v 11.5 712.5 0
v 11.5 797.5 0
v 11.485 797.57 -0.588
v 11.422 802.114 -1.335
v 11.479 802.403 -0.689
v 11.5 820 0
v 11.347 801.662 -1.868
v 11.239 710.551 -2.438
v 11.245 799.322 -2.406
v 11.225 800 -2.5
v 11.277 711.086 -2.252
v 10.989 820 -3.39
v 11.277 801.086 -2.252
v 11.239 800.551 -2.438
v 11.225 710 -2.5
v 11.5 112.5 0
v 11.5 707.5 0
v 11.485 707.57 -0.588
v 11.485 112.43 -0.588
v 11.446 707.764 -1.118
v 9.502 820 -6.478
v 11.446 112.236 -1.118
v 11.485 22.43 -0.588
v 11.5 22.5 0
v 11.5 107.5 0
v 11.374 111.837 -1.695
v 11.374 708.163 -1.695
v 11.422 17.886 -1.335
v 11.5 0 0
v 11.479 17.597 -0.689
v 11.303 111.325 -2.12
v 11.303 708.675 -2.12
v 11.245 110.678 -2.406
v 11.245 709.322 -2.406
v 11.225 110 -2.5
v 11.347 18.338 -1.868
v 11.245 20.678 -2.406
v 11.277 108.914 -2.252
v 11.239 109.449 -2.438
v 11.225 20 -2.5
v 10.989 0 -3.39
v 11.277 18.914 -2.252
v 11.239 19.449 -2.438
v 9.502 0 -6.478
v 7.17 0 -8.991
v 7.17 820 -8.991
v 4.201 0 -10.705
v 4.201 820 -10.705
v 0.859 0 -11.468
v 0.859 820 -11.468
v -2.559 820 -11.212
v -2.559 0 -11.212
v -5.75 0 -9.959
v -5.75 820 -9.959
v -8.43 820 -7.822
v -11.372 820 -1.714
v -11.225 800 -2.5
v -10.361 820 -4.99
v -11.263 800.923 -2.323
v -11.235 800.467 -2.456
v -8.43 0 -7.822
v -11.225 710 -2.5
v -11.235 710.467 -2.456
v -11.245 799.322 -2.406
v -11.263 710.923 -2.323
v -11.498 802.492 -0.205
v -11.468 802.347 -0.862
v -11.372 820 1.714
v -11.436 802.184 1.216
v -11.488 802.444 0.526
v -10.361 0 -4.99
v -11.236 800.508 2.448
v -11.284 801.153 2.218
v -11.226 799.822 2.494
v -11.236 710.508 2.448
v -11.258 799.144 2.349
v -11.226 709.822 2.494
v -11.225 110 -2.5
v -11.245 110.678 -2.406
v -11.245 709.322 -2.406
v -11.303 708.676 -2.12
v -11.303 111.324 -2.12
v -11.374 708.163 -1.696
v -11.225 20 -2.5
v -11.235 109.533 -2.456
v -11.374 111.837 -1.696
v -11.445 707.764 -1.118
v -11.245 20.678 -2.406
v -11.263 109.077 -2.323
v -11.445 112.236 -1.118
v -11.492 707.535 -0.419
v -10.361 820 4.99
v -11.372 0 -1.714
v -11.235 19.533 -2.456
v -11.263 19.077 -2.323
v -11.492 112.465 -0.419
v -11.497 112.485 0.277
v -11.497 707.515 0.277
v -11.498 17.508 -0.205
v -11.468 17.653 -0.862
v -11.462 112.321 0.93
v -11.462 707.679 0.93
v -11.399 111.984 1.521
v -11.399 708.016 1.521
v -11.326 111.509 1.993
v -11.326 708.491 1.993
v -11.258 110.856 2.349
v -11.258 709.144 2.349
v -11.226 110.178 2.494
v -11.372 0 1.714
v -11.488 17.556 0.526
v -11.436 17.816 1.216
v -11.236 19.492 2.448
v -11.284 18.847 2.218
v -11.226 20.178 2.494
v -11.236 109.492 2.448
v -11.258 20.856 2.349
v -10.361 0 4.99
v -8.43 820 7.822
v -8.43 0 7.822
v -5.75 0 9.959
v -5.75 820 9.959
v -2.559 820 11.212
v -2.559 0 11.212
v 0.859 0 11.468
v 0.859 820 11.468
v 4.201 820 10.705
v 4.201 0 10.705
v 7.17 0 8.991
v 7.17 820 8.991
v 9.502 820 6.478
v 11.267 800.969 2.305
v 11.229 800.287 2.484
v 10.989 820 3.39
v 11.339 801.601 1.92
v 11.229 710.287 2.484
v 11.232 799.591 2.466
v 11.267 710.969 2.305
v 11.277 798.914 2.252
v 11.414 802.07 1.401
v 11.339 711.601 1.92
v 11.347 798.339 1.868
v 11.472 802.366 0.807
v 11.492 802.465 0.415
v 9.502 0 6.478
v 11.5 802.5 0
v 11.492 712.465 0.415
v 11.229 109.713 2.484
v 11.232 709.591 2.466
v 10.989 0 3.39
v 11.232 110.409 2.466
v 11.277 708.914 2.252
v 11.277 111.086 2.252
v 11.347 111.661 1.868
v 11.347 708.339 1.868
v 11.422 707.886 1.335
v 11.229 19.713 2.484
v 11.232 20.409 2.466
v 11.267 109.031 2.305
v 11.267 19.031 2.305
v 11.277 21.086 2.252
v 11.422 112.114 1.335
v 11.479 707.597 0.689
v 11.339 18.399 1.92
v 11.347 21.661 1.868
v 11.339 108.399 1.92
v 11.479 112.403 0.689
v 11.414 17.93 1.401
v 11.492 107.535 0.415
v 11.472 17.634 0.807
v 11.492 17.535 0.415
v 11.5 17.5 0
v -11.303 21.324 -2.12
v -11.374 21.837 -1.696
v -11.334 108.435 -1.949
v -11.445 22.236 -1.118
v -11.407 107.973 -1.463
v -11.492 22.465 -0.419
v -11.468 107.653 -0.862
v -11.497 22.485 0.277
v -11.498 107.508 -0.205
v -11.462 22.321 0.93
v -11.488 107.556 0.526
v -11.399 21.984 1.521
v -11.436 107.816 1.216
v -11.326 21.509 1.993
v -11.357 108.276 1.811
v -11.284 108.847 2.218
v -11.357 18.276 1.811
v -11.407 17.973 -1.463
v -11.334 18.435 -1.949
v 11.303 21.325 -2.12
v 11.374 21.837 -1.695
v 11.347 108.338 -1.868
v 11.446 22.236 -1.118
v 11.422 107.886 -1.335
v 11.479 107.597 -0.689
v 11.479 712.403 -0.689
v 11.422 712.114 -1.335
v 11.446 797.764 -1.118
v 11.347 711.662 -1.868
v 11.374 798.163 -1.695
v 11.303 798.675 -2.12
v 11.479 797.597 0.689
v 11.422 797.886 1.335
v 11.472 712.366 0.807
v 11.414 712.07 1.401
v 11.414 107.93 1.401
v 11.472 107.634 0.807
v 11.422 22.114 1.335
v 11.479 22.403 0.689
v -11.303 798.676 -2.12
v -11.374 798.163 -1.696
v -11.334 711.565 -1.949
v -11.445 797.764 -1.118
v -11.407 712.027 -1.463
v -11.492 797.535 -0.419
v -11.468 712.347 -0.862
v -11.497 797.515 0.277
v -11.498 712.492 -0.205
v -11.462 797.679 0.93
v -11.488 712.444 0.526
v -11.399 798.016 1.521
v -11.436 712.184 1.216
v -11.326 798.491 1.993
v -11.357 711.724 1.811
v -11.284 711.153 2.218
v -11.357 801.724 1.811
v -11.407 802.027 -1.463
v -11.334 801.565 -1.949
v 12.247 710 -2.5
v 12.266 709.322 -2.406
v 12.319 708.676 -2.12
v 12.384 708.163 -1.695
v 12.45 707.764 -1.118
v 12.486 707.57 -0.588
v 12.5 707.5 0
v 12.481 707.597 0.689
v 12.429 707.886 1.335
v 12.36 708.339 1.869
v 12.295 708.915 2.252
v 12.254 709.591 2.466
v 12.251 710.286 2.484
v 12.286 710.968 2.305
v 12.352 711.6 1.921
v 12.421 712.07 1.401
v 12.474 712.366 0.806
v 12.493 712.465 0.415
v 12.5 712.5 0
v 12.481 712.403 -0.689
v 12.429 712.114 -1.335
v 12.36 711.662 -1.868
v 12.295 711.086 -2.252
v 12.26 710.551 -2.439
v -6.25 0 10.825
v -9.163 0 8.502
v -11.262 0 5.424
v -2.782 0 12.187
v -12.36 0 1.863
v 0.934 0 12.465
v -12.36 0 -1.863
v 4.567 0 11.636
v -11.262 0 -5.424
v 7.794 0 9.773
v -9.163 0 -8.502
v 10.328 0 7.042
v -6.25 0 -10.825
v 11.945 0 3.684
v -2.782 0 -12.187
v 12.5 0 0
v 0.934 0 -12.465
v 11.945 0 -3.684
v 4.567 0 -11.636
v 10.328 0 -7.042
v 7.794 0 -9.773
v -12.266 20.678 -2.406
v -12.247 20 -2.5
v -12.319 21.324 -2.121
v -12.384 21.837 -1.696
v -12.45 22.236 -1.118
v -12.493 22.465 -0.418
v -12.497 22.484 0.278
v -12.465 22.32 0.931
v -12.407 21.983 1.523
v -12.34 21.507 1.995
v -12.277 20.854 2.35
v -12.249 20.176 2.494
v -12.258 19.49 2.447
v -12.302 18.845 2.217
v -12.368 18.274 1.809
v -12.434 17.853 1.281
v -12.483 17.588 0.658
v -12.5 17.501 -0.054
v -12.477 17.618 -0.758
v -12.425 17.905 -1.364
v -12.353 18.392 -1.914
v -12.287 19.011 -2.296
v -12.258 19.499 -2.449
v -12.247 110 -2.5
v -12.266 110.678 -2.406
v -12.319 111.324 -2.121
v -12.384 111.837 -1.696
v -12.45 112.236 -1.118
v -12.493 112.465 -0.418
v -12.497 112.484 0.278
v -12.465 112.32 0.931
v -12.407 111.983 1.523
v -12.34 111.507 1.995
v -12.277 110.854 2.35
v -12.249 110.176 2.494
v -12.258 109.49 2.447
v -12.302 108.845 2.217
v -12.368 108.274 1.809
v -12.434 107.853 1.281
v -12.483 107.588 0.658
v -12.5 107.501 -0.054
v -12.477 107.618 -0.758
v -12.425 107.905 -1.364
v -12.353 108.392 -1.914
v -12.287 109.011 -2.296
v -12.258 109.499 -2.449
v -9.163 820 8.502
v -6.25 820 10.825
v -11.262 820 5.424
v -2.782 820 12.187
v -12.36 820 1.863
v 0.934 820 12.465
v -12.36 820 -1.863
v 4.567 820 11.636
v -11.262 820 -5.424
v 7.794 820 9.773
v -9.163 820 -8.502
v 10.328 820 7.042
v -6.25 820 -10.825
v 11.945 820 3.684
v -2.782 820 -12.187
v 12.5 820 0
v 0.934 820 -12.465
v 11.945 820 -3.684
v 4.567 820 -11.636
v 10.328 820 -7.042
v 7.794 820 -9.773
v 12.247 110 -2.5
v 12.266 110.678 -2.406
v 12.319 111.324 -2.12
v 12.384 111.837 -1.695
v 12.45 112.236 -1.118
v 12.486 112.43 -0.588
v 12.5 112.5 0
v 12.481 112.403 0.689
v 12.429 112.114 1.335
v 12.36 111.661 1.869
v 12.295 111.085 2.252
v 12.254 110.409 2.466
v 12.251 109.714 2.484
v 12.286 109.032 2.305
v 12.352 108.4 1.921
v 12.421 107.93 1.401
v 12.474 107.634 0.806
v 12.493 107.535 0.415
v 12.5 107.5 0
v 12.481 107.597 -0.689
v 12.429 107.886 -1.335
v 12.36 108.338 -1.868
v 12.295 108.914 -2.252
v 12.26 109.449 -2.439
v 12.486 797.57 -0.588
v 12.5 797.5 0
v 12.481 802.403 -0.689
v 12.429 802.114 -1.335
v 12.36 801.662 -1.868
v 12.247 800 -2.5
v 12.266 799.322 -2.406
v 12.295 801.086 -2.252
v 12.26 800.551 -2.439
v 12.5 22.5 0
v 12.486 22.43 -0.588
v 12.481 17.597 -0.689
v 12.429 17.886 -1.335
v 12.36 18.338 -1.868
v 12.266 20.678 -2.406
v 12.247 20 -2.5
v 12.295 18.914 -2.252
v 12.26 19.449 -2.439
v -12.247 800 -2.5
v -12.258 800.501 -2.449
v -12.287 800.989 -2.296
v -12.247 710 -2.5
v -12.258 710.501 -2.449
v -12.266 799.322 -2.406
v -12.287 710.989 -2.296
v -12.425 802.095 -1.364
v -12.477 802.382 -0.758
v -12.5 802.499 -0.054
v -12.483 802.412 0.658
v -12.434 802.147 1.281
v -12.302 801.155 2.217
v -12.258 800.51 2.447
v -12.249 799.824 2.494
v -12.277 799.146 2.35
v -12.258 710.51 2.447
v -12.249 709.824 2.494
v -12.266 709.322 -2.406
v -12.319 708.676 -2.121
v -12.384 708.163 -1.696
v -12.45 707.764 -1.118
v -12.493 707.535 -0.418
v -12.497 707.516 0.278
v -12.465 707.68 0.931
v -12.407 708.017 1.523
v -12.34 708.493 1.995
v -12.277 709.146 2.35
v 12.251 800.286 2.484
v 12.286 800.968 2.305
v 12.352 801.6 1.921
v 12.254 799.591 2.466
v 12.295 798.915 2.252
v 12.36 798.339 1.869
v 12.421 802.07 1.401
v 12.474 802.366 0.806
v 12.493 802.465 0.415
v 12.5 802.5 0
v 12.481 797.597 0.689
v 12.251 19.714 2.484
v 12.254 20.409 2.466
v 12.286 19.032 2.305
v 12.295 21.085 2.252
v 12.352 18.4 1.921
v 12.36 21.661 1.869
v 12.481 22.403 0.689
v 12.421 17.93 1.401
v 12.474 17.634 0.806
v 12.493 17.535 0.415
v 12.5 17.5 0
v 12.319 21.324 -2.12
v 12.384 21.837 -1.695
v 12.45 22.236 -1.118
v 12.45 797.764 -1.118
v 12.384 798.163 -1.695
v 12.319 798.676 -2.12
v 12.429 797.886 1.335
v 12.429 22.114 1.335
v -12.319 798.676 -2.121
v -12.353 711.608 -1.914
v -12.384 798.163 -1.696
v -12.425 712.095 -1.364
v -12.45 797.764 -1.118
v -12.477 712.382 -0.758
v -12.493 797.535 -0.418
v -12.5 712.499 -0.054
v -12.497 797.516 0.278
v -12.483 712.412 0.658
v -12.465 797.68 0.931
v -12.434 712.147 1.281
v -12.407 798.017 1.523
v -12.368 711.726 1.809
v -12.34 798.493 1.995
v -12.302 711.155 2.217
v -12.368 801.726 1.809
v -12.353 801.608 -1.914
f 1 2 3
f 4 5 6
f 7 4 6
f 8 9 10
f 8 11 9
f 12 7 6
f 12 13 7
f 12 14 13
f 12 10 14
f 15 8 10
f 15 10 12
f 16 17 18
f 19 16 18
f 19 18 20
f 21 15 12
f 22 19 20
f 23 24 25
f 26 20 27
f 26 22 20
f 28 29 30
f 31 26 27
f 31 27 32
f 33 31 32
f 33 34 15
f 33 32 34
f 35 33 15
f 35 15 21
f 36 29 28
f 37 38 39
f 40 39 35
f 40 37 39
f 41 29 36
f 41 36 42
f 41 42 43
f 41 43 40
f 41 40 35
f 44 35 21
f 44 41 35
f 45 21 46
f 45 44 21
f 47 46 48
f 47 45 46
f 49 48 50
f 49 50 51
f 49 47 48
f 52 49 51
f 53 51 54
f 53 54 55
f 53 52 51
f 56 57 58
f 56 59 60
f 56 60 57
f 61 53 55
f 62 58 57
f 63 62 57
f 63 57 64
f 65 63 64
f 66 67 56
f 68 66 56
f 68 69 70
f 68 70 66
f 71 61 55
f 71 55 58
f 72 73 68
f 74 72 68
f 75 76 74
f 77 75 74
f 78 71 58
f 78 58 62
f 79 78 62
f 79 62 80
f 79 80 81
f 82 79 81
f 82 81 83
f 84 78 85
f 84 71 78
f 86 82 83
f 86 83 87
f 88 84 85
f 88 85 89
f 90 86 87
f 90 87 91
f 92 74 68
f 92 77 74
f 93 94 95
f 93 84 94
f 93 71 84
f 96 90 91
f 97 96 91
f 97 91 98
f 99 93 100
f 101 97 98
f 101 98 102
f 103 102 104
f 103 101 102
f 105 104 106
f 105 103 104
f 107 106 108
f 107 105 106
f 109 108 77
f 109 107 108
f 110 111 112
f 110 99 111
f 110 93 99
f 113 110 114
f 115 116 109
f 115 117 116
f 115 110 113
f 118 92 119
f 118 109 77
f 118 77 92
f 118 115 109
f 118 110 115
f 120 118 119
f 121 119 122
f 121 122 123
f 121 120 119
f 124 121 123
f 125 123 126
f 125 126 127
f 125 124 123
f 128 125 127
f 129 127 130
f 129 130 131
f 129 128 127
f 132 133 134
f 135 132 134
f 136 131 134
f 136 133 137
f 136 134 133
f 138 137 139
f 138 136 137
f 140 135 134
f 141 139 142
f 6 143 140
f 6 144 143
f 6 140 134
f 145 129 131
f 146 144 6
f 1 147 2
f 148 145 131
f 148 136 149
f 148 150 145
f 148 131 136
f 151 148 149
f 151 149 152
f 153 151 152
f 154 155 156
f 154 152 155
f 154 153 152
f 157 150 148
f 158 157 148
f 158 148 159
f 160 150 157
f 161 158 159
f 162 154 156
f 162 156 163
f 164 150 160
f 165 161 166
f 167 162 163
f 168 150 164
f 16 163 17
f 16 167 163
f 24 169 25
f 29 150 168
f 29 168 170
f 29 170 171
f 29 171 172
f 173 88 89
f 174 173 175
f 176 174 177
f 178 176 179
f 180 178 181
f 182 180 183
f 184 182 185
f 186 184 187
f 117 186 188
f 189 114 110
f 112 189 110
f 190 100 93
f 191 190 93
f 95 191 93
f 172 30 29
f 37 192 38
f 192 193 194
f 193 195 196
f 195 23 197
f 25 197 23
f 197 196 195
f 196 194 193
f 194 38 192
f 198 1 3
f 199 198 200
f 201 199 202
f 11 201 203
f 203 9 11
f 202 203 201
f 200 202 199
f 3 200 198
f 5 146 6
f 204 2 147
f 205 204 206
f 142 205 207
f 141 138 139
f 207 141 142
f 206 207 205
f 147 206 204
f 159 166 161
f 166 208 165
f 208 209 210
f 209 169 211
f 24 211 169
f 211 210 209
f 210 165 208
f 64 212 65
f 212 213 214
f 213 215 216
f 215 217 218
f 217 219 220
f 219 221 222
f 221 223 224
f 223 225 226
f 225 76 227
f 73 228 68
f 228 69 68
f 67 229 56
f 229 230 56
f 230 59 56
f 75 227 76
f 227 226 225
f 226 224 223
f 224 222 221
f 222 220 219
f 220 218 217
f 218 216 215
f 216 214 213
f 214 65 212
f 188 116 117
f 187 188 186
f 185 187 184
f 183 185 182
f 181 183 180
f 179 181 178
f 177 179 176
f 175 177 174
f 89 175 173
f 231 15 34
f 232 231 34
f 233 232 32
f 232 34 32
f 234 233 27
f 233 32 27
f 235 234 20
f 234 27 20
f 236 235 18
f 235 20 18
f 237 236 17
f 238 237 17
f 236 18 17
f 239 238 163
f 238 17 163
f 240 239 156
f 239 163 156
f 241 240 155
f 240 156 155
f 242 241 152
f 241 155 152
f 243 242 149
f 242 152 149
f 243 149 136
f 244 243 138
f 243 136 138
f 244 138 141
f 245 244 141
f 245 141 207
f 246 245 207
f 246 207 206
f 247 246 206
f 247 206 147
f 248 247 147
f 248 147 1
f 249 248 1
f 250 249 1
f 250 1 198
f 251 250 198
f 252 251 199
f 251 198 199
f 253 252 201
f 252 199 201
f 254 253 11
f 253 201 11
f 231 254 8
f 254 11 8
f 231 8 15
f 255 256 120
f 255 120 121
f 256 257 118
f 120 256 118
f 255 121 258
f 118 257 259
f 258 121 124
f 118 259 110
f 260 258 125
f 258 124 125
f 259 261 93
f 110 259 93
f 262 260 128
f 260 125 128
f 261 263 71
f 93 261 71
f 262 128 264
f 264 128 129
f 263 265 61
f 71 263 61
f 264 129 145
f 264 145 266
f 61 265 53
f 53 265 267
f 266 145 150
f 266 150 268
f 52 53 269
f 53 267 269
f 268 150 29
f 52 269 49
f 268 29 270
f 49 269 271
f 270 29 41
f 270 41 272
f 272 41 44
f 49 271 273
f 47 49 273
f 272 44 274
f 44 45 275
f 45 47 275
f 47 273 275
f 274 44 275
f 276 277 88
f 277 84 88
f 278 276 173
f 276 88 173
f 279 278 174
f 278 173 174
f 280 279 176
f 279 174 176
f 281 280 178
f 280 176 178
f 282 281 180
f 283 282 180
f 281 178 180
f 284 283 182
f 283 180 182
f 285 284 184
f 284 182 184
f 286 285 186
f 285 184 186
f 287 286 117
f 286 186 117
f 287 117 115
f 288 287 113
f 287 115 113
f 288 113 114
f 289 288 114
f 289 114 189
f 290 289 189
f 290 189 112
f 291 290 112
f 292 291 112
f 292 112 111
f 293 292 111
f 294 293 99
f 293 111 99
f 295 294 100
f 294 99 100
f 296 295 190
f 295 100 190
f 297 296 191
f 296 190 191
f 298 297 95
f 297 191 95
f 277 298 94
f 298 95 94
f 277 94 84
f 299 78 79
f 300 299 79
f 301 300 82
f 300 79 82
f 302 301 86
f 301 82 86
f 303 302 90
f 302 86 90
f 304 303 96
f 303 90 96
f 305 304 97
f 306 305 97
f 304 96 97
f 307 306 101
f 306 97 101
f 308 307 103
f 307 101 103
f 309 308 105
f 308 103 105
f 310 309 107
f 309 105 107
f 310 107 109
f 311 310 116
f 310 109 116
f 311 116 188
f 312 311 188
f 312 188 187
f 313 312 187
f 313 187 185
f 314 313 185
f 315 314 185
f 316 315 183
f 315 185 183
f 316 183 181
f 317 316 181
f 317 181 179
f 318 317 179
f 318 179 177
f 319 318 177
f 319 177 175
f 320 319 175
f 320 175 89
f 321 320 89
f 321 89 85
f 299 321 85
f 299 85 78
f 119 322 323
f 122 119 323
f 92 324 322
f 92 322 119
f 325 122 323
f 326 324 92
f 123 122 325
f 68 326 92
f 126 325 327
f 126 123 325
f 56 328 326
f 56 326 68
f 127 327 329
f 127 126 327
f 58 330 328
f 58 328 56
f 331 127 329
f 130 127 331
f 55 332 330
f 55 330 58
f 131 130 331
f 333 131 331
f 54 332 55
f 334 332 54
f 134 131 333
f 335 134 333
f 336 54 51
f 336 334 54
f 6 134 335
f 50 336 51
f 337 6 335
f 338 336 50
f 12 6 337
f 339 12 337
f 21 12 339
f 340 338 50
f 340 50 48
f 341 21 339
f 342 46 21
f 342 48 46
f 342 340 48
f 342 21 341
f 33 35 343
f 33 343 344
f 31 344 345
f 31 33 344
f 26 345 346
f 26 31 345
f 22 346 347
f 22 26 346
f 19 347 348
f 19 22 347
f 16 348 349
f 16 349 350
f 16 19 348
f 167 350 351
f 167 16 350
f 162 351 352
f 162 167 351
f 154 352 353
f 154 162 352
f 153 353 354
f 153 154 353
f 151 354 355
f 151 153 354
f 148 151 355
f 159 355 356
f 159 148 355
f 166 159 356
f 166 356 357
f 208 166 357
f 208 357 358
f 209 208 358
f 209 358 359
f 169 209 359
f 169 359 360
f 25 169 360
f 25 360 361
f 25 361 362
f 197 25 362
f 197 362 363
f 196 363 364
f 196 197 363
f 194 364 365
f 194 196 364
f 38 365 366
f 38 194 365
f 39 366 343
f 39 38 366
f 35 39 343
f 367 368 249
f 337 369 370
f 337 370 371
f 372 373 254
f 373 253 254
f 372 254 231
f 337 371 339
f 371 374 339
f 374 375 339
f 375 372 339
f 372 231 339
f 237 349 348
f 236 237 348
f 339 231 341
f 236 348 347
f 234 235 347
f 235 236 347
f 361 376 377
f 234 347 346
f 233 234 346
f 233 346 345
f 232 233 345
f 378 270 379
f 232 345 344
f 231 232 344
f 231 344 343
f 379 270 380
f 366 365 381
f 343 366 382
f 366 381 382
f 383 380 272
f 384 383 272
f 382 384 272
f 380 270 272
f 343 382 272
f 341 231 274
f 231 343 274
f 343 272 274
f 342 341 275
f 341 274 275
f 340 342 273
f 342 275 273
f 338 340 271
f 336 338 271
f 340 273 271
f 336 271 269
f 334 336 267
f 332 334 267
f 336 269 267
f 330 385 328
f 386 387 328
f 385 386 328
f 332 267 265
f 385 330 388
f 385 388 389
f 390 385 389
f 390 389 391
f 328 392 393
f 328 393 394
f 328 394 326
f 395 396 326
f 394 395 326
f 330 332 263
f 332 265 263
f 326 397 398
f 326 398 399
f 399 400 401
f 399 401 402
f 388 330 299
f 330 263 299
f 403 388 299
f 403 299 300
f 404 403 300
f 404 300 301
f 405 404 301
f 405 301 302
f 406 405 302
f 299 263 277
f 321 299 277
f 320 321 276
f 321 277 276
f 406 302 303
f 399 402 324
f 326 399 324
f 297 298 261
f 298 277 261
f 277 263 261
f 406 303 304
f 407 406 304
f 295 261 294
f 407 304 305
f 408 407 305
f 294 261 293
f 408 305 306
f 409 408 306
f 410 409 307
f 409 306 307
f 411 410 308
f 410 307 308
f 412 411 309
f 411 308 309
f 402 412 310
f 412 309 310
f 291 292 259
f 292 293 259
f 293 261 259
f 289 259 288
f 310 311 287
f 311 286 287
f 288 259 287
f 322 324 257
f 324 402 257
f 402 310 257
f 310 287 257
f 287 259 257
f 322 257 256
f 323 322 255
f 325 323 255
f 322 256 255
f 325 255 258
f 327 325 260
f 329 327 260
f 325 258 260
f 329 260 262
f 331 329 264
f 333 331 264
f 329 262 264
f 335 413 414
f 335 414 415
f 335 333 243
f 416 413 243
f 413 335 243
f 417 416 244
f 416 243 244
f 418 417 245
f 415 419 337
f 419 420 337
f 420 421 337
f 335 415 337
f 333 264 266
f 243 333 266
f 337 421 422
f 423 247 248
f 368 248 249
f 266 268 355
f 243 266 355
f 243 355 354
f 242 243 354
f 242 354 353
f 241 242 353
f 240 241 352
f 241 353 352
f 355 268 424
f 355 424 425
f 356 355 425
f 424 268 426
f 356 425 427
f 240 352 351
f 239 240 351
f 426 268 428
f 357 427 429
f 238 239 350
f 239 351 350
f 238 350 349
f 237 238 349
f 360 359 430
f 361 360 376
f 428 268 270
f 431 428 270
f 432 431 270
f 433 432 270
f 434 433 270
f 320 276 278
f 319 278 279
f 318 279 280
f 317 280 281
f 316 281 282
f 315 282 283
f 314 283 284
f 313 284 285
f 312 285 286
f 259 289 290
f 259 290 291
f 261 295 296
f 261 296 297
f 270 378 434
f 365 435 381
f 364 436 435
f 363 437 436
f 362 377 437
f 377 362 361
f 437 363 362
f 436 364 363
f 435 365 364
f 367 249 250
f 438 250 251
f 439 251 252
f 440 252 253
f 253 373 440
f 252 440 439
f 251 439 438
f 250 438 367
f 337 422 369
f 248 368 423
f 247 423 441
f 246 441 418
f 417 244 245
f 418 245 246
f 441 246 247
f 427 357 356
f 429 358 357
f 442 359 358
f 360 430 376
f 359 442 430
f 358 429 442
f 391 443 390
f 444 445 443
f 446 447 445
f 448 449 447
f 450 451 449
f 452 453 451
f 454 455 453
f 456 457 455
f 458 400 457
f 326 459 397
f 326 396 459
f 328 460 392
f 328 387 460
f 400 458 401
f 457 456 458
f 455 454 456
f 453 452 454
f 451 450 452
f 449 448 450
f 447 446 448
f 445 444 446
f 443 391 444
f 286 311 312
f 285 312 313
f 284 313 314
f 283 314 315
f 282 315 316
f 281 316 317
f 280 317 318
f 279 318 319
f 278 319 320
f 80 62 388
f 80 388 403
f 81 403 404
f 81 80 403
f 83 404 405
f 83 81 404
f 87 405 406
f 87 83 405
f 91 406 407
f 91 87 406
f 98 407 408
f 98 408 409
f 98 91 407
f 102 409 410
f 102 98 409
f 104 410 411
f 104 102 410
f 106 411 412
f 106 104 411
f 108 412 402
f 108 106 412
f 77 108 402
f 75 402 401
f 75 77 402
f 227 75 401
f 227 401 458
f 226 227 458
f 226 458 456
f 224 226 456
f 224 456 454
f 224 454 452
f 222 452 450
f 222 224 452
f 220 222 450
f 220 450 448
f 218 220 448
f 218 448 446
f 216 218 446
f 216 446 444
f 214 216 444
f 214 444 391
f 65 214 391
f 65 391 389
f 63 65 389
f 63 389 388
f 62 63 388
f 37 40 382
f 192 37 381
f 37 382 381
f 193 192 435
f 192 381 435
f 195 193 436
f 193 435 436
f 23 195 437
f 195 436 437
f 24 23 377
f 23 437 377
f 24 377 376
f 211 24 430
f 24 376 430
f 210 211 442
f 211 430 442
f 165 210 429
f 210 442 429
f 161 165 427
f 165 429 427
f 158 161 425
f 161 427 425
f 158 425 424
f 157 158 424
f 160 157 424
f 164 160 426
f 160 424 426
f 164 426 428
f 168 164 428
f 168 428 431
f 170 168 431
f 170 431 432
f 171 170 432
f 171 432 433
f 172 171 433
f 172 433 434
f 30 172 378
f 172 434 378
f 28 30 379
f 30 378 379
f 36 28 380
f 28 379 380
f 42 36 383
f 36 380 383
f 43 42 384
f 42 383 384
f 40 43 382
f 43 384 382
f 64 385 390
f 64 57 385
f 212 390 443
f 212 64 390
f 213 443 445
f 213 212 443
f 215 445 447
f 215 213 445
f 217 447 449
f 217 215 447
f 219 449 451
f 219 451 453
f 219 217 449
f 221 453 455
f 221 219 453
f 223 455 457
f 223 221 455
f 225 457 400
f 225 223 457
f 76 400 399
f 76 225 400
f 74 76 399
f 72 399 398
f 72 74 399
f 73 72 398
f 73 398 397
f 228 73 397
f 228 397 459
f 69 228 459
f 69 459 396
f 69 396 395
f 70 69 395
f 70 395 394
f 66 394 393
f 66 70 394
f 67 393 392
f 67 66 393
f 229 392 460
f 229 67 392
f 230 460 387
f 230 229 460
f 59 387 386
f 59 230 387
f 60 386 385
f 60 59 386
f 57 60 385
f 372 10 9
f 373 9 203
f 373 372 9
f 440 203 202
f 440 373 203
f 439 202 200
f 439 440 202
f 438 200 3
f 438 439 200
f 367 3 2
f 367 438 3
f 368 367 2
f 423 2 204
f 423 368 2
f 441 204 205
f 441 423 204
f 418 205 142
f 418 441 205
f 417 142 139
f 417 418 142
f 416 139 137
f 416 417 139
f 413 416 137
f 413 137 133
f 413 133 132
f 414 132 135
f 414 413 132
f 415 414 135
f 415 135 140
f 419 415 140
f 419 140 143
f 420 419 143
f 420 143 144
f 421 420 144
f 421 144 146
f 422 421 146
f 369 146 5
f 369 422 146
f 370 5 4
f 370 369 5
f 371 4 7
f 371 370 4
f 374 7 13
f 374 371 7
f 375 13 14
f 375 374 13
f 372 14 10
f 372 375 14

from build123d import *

# Parameters (mm, degrees)
SKETCH_1_R          = 12.5
SKETCH_1_R_2        = 11.5
EXTRUDE_1_DEPTH     = 820
SKETCH_2_R          = 2.5
CUT_EXTRUDE_1_DEPTH = 821.190526646


with BuildPart() as part:
    # Эскиз1 → Вытянуть-Тонкостенный1 (new body)
    with BuildSketch(Plane(origin=(0, 0, 0), x_dir=(1, 0, 0), z_dir=(0, 1, 0))):
        Circle(SKETCH_1_R)
        Circle(SKETCH_1_R_2, mode=Mode.SUBTRACT)
    extrude(amount=EXTRUDE_1_DEPTH)

    # Эскиз2 → Вырез-Вытянуть1 (cut, symmetric)
    with BuildSketch(Plane(origin=(0, 0, 0), x_dir=(0, 0, -1), z_dir=(1, 0, 0))):
        with Locations((0, 110)):
            Circle(SKETCH_2_R)
        with Locations((0, 20)):
            Circle(SKETCH_2_R)
    cut_extrude_1 = extrude(amount=CUT_EXTRUDE_1_DEPTH, both=True, mode=Mode.SUBTRACT)

    # Зеркальное отражение1: Вырез-Вытянуть1 across plane
    add(cut_extrude_1.mirror(Plane(origin=(0, 410, 0), x_dir=(0, 0, 1), z_dir=(0, -1, 0))), mode=Mode.SUBTRACT)


solid = part.part
